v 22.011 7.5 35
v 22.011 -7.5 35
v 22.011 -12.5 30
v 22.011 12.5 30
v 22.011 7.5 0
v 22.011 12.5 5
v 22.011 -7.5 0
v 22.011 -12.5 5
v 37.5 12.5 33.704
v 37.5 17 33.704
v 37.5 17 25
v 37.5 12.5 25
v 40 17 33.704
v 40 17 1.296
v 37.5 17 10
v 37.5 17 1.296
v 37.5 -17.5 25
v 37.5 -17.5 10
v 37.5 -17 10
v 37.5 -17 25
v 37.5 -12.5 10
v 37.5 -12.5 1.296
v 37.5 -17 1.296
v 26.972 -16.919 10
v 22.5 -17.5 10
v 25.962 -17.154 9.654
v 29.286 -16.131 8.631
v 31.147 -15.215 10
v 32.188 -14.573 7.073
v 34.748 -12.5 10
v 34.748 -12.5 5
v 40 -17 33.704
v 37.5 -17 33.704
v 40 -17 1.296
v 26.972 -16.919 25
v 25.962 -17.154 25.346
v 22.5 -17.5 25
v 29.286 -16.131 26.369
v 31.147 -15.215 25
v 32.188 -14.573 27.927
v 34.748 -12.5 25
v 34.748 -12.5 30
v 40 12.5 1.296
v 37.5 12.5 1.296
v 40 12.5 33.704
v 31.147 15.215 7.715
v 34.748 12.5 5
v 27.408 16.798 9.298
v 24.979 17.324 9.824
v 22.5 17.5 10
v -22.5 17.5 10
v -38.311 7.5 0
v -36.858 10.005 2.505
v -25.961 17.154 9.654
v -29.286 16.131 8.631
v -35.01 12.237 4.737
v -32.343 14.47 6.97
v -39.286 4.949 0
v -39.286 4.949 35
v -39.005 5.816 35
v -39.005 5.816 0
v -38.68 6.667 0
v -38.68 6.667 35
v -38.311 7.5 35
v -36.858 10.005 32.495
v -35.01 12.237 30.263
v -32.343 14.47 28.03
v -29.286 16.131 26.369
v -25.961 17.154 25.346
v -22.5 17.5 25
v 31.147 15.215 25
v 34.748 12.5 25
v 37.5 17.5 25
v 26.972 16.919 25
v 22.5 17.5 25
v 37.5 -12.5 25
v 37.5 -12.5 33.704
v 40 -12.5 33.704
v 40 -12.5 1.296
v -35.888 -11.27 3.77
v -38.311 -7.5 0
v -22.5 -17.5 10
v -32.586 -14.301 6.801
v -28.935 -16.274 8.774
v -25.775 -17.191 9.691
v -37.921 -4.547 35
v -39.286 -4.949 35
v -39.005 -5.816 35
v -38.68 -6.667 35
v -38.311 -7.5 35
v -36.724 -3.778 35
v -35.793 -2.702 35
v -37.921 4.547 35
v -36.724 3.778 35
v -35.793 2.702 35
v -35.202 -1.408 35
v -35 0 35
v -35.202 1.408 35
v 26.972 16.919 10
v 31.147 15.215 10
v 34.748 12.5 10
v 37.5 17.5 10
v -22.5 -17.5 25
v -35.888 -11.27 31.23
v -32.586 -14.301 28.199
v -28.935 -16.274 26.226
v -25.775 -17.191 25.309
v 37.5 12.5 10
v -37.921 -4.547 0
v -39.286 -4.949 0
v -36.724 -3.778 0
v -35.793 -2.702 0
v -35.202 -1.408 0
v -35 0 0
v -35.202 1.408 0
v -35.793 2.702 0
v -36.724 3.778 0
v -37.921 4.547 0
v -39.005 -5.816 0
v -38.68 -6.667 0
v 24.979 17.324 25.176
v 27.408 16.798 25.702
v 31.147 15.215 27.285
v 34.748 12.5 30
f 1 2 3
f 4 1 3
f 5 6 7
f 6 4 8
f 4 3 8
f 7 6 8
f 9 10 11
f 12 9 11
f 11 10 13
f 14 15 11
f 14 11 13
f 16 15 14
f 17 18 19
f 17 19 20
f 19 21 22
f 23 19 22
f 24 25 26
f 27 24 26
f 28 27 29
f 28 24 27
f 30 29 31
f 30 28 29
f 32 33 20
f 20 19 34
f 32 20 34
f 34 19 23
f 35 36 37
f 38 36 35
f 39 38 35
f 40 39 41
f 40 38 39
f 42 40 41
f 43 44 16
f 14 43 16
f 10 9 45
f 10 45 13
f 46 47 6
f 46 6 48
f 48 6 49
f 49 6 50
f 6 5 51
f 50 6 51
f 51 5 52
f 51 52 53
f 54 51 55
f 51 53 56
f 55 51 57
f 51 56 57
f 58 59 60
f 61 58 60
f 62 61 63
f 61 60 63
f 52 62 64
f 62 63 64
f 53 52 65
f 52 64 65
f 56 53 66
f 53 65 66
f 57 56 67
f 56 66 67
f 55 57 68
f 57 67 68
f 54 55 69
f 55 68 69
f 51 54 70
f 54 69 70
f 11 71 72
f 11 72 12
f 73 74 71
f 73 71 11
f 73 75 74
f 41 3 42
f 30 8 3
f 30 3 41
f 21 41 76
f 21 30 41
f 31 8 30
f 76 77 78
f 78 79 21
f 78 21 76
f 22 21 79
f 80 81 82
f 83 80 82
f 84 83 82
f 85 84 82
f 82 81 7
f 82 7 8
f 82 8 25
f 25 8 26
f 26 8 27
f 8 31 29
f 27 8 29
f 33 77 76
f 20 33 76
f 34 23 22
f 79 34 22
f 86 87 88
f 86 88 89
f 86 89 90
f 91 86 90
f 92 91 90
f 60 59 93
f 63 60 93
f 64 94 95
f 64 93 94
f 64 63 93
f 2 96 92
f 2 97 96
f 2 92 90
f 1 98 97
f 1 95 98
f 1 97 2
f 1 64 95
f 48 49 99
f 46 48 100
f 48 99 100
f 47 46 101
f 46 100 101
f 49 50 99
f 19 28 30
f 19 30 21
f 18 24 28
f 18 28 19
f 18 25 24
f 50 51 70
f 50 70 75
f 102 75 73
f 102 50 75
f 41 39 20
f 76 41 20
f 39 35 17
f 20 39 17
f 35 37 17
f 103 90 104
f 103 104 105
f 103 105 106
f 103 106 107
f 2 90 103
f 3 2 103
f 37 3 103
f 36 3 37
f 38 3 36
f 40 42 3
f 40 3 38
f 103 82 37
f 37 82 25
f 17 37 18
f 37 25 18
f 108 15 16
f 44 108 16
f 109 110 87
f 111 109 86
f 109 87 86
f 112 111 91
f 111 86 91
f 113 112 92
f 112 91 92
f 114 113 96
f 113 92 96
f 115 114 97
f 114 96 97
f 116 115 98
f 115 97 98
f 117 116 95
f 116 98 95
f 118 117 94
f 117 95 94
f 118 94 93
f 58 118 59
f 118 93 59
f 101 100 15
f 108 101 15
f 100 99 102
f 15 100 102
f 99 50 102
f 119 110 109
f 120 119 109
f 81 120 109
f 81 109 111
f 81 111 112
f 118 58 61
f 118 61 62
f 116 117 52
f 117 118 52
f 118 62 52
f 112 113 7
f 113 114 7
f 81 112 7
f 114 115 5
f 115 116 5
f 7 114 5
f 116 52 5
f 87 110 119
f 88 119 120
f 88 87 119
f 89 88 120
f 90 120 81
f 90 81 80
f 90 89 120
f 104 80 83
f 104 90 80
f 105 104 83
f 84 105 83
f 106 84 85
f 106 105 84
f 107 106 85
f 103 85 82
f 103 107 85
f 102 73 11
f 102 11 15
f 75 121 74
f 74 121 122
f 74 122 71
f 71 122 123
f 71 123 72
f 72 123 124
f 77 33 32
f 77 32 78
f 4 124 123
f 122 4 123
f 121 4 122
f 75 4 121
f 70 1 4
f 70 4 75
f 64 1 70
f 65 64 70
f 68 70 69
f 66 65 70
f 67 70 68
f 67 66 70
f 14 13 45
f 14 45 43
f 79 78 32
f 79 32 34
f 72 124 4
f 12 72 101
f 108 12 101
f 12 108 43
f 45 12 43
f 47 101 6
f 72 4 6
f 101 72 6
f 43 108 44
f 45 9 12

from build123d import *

# Parameters (mm, degrees)
IZIM1_W                     = 80
IZIM1_H                     = 35
Y_KSEKLIK_EKSTR_ZYON1_DEPTH = 35
RADYUS1_R                   = 17.5
RADYUS2_R                   = 17.5
RADYUS3_R                   = 17.5
IZIM2_R                     = 5
KES_EKSTR_ZYON1_DEPTH       = 56.957573214
PAH1_SIZE                   = 10
IZIM3_W                     = 37.5
IZIM3_H                     = 15
Y_KSEKLIK_EKSTR_ZYON2_DEPTH = 5
IZIM4_W                     = 37.5
IZIM4_H                     = 15
Y_KSEKLIK_EKSTR_ZYON3_DEPTH = 5
IZIM6_W                     = 17.989484019
IZIM6_H                     = 35
KES_EKSTR_ZYON2_DEPTH       = 25
IZIM7_W                     = 32.408876432
IZIM7_H                     = 4.5
Y_KSEKLIK_EKSTR_ZYON4_DEPTH = 2.5


# Some blends are built 0.0001 mm under size
with BuildPart() as part:
    # Çizim1 → Yükseklik-Ekstrüzyon1 (new body)
    with BuildSketch(Plane.XY):
        Rectangle(IZIM1_W, IZIM1_H)
    extrude(amount=Y_KSEKLIK_EKSTR_ZYON1_DEPTH)

    # Radyus1
    radyus1_edges = [part.edges().sort_by_distance(p)[0] for p in [
        (-40, 17.5, 17.5),
    ]]
    fillet(radyus1_edges, radius=RADYUS1_R)

    # Radyus2
    radyus2_edges = [part.edges().sort_by_distance(p)[0] for p in [
        (-40, -17.5, 17.5),
    ]]
    fillet(radyus2_edges, radius=RADYUS2_R - 0.0001)  # a hair under: the kernel refuses the full size

    # Radyus3
    radyus3_edges = [part.edges().sort_by_distance(p)[0] for p in [
        (40, -17.5, 17.5),
        (40, 17.5, 17.5),
    ]]
    fillet(radyus3_edges, radius=RADYUS3_R - 0.0001)  # a hair under: the kernel refuses the full size

    # Çizim2 → Kes-Ekstrüzyon1 (cut, through all)
    with BuildSketch(Plane.XY.offset(35)):
        with Locations((-40, 0)):
            Circle(IZIM2_R)
    extrude(amount=-KES_EKSTR_ZYON1_DEPTH, mode=Mode.SUBTRACT)

    # Pah1
    # the kernel refuses this chamfer: 10 mm, written as the material it takes off along each edge
    with BuildSketch(Plane(origin=(48.21692988, -17.5, 0), x_dir=(0, 0.9996219169112968, -0.027495876610586372), z_dir=(-1, 0, 0))) as pah1_piece_1:
        Polygon((PAH1_SIZE * 0.999621916911, -PAH1_SIZE * 0.0274958766106), (-PAH1_SIZE * 0.0274958766106, -PAH1_SIZE * 0.999621916911), (0, 0), align=None)
    extrude(amount=96.433859759, mode=Mode.SUBTRACT)
    with BuildSketch(Plane(origin=(48.21692988, -17.5, 35), x_dir=(0, 0.9996219169112968, 0.027495876610586317), z_dir=(-1, 0, 0))) as pah1_piece_2:
        Polygon((PAH1_SIZE * 0.999621916911, PAH1_SIZE * 0.0274958766106), (-PAH1_SIZE * 0.0274958766106, PAH1_SIZE * 0.999621916911), (0, 0), align=None)
    extrude(amount=96.433859759, mode=Mode.SUBTRACT)
    with BuildSketch(Plane(origin=(-48.21682988, 17.5, 0), x_dir=(0, -0.9996219169112968, -0.027495876610586372), z_dir=(1, 0, 0))) as pah1_piece_3:
        Polygon((PAH1_SIZE * 0.999621916911, -PAH1_SIZE * 0.0274958766106), (-PAH1_SIZE * 0.0274958766106, -PAH1_SIZE * 0.999621916911), (0, 0), align=None)
    extrude(amount=96.433759759, mode=Mode.SUBTRACT)
    with BuildSketch(Plane(origin=(-48.21682988, 17.5, 35), x_dir=(0, -0.9996219169112968, 0.027495876610586317), z_dir=(1, 0, 0))) as pah1_piece_4:
        Polygon((PAH1_SIZE * 0.999621916911, PAH1_SIZE * 0.0274958766106), (-PAH1_SIZE * 0.0274958766106, PAH1_SIZE * 0.999621916911), (0, 0), align=None)
    extrude(amount=96.433759759, mode=Mode.SUBTRACT)

    # Çizim3 → Yükseklik-Ekstrüzyon2 (add)
    with BuildSketch(Plane(origin=(0, 17.5, 0), x_dir=(1, 0, 0), z_dir=(0, 1, 0))):
        with Locations((18.75, -17.5)):
            Rectangle(IZIM3_W, IZIM3_H)
    extrude(amount=-Y_KSEKLIK_EKSTR_ZYON2_DEPTH)

    # Çizim4 → Yükseklik-Ekstrüzyon3 (add)
    with BuildSketch(Plane.XZ.offset(17.5)):
        with Locations((18.75, 17.5)):
            Rectangle(IZIM4_W, IZIM4_H)
    extrude(amount=-Y_KSEKLIK_EKSTR_ZYON3_DEPTH)

    # Çizim6 → Kes-Ekstrüzyon2 (cut)
    with BuildSketch(Plane(origin=(0, -12.5, 0), x_dir=(1, 0, 0), z_dir=(0, 1, 0))):
        with Locations((31.00525799, -17.5)):
            Rectangle(IZIM6_W, IZIM6_H)
    extrude(amount=KES_EKSTR_ZYON2_DEPTH, mode=Mode.SUBTRACT)

    # Çizim7 → Yükseklik-Ekstrüzyon4 (add)
    with BuildSketch(Plane(origin=(37.5, 0, 0), x_dir=(0, 0, -1), z_dir=(1, 0, 0))):
        with Locations((-17.5, 14.75)):
            Rectangle(IZIM7_W, IZIM7_H)
        with Locations((-17.5, -14.75)):
            Rectangle(IZIM7_W, IZIM7_H)
    extrude(amount=Y_KSEKLIK_EKSTR_ZYON4_DEPTH)


solid = part.part
